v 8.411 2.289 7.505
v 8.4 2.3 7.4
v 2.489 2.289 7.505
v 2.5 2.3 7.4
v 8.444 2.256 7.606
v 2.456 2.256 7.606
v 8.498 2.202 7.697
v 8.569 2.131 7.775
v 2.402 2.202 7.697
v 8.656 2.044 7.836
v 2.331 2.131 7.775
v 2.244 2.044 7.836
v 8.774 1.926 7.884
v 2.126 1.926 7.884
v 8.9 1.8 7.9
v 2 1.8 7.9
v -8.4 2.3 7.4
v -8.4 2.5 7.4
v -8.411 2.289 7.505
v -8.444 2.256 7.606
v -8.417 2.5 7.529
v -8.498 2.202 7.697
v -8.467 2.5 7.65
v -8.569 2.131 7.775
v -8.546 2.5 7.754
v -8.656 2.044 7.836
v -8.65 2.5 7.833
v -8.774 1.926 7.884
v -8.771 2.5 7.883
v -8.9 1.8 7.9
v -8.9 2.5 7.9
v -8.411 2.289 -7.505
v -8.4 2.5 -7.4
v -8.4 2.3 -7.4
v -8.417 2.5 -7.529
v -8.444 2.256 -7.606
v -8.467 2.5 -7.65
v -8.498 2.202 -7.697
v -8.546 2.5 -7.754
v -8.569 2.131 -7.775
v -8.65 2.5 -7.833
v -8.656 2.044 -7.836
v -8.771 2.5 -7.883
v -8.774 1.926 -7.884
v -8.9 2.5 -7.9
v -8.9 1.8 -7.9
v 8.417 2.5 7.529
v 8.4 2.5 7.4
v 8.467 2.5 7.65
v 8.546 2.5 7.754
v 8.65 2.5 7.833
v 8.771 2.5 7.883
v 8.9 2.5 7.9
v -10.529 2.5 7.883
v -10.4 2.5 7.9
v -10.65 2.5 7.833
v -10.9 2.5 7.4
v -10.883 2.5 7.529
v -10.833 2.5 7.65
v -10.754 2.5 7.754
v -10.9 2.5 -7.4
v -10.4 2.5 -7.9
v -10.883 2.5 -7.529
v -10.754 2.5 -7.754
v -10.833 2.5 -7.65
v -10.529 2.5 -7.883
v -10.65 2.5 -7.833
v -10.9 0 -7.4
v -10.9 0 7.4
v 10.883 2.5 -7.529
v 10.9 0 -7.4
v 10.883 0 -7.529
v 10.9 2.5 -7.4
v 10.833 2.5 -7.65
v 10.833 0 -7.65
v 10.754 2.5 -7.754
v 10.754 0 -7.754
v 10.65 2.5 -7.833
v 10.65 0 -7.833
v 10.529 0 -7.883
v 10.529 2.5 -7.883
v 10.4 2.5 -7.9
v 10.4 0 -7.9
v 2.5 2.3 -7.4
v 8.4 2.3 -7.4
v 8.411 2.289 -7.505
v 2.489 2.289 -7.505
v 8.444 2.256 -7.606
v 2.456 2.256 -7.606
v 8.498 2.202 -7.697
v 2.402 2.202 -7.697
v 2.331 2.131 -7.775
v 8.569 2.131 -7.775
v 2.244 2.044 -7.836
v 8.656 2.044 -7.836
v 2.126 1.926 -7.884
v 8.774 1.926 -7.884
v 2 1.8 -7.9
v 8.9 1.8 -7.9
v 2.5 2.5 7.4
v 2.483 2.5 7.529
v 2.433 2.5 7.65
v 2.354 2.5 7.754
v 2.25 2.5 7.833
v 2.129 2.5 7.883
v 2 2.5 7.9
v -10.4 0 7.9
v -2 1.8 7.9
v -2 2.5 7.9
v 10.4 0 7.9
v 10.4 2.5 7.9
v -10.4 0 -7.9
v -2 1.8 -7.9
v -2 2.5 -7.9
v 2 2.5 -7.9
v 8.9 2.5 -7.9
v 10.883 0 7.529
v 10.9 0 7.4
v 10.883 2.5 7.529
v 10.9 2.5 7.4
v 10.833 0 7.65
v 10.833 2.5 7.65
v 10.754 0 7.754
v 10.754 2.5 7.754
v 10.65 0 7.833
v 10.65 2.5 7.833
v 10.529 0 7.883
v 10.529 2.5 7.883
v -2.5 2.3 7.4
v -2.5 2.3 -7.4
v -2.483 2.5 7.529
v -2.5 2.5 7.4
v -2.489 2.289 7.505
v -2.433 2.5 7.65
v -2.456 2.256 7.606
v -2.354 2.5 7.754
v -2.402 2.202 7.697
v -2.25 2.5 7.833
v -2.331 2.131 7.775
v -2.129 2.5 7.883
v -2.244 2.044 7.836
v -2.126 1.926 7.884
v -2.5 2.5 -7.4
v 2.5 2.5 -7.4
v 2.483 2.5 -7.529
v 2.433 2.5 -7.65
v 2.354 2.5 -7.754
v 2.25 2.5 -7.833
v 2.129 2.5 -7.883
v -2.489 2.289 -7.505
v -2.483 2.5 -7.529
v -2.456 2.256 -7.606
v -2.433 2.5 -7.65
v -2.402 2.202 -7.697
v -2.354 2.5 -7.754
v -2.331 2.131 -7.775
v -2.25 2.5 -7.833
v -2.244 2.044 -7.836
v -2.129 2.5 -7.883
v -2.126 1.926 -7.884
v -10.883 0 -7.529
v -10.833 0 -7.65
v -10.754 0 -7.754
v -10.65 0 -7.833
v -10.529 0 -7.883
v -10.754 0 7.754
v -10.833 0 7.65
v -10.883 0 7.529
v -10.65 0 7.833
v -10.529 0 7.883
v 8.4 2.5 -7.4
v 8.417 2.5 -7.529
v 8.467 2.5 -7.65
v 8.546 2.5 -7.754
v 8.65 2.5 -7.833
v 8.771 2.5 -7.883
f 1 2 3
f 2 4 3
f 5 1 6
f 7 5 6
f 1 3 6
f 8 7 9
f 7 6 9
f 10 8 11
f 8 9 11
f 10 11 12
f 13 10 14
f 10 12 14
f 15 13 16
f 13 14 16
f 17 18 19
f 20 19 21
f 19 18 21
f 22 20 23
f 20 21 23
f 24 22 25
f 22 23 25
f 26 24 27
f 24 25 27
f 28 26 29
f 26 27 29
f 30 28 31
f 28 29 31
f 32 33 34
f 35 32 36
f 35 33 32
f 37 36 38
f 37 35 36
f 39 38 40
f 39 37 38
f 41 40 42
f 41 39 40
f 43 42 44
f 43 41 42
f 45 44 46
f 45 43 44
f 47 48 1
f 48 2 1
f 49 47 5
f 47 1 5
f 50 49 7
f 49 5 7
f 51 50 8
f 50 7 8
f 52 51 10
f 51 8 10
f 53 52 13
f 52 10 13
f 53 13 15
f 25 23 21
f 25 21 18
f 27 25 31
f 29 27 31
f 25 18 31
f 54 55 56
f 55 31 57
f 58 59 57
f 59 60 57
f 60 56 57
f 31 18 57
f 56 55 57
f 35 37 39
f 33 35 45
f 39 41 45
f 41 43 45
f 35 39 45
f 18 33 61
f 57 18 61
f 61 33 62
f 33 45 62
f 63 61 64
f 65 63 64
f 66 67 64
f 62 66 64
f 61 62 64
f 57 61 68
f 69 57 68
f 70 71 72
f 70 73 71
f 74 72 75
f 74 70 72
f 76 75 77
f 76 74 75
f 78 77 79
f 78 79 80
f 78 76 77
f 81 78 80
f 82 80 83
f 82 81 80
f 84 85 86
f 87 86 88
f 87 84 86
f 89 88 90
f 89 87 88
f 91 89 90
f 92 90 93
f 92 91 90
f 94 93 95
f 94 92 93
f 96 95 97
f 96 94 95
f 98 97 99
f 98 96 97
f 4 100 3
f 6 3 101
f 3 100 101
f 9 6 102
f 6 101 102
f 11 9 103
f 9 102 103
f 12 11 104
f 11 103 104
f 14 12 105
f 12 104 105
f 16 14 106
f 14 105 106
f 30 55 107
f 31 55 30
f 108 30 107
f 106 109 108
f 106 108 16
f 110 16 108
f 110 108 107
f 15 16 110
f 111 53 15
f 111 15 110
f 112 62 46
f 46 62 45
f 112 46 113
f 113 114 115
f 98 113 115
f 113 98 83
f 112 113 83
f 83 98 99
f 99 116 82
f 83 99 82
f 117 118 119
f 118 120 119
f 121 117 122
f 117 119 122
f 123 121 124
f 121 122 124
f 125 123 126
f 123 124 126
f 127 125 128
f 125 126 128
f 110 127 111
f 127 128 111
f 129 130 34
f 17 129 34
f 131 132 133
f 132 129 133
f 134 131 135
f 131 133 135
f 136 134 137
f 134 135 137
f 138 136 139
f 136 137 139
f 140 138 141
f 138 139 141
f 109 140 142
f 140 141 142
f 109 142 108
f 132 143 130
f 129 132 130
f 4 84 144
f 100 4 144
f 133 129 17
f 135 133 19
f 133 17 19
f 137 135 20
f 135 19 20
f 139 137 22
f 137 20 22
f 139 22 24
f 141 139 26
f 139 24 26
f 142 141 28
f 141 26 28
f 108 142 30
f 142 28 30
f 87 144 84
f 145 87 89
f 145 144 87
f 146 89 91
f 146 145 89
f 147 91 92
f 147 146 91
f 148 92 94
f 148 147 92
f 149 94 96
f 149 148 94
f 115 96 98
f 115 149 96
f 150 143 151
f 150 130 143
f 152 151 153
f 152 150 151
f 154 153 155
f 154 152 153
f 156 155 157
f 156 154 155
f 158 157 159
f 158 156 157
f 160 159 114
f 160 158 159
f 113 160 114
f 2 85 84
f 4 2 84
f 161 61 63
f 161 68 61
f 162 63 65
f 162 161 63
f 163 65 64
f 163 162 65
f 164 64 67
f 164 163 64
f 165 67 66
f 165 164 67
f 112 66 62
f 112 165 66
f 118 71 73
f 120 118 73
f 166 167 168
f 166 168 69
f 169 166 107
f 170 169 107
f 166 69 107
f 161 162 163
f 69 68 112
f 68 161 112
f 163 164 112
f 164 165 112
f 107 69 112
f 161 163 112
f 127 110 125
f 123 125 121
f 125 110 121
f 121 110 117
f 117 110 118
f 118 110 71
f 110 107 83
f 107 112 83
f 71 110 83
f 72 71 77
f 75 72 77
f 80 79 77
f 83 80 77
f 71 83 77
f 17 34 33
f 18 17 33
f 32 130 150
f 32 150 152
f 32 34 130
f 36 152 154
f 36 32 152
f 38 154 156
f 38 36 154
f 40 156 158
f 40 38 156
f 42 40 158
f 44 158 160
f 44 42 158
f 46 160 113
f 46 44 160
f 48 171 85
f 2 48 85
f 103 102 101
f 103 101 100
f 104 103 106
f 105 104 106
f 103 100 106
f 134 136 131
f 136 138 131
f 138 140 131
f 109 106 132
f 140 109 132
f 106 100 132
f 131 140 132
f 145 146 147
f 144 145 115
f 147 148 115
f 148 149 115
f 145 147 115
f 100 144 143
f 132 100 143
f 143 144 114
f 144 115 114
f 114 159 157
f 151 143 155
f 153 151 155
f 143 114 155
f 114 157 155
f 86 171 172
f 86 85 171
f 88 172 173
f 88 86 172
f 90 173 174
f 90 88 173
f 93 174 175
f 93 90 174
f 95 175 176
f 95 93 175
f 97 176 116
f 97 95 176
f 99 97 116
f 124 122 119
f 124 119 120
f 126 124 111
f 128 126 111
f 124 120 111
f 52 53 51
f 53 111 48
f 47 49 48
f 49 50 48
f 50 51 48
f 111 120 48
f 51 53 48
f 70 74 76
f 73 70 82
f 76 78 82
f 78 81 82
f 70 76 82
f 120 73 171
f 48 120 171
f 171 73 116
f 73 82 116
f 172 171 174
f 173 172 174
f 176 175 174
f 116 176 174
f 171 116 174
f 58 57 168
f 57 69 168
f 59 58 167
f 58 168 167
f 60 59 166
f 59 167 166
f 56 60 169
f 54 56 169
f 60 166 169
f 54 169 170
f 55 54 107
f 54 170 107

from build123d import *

# Parameters (mm, degrees)
EXTRUDE_1_DEPTH      = 7.9
EXTRUDE_1_DEPTH_BACK = 7.9
FILLET_1_R           = 0.5


with BuildPart() as part:
    # Эскиз1 → Бобышка-Вытянуть1 (new, two sides: drawn at the far end of the back side and taken through both)
    with BuildSketch(Plane.XY.offset(-EXTRUDE_1_DEPTH_BACK)):
        Polygon((-10.9, 0), (10.9, 0), (10.9, 2.5), (8.4, 2.5), (8.4, 2.3), (2.5, 2.3), (2.5, 2.5), (-2.5, 2.5), (-2.5, 2.3), (-8.4, 2.3), (-8.4, 2.5), (-10.9, 2.5), align=None)
    extrude(amount=EXTRUDE_1_DEPTH + EXTRUDE_1_DEPTH_BACK)

    # Скругление1
    fillet_1_edges = [part.edges().sort_by_distance(p)[0] for p in [
        (8.4, 2.4, -7.9),
        (5.45, 2.3, -7.9),
        (2.5, 2.4, -7.9),
        (-2.5, 2.4, -7.9),
        (-5.45, 2.3, -7.9),
        (-8.4, 2.4, -7.9),
        (10.9, 1.25, 7.9),
        (8.4, 2.4, 7.9),
        (-10.9, 1.25, -7.9),
        (5.45, 2.3, 7.9),
        (2.5, 2.4, 7.9),
        (-2.5, 2.4, 7.9),
        (-5.45, 2.3, 7.9),
        (-8.4, 2.4, 7.9),
        (-10.9, 1.25, 7.9),
        (10.9, 1.25, -7.9),
    ]]
    fillet(fillet_1_edges, radius=FILLET_1_R)


solid = part.part
